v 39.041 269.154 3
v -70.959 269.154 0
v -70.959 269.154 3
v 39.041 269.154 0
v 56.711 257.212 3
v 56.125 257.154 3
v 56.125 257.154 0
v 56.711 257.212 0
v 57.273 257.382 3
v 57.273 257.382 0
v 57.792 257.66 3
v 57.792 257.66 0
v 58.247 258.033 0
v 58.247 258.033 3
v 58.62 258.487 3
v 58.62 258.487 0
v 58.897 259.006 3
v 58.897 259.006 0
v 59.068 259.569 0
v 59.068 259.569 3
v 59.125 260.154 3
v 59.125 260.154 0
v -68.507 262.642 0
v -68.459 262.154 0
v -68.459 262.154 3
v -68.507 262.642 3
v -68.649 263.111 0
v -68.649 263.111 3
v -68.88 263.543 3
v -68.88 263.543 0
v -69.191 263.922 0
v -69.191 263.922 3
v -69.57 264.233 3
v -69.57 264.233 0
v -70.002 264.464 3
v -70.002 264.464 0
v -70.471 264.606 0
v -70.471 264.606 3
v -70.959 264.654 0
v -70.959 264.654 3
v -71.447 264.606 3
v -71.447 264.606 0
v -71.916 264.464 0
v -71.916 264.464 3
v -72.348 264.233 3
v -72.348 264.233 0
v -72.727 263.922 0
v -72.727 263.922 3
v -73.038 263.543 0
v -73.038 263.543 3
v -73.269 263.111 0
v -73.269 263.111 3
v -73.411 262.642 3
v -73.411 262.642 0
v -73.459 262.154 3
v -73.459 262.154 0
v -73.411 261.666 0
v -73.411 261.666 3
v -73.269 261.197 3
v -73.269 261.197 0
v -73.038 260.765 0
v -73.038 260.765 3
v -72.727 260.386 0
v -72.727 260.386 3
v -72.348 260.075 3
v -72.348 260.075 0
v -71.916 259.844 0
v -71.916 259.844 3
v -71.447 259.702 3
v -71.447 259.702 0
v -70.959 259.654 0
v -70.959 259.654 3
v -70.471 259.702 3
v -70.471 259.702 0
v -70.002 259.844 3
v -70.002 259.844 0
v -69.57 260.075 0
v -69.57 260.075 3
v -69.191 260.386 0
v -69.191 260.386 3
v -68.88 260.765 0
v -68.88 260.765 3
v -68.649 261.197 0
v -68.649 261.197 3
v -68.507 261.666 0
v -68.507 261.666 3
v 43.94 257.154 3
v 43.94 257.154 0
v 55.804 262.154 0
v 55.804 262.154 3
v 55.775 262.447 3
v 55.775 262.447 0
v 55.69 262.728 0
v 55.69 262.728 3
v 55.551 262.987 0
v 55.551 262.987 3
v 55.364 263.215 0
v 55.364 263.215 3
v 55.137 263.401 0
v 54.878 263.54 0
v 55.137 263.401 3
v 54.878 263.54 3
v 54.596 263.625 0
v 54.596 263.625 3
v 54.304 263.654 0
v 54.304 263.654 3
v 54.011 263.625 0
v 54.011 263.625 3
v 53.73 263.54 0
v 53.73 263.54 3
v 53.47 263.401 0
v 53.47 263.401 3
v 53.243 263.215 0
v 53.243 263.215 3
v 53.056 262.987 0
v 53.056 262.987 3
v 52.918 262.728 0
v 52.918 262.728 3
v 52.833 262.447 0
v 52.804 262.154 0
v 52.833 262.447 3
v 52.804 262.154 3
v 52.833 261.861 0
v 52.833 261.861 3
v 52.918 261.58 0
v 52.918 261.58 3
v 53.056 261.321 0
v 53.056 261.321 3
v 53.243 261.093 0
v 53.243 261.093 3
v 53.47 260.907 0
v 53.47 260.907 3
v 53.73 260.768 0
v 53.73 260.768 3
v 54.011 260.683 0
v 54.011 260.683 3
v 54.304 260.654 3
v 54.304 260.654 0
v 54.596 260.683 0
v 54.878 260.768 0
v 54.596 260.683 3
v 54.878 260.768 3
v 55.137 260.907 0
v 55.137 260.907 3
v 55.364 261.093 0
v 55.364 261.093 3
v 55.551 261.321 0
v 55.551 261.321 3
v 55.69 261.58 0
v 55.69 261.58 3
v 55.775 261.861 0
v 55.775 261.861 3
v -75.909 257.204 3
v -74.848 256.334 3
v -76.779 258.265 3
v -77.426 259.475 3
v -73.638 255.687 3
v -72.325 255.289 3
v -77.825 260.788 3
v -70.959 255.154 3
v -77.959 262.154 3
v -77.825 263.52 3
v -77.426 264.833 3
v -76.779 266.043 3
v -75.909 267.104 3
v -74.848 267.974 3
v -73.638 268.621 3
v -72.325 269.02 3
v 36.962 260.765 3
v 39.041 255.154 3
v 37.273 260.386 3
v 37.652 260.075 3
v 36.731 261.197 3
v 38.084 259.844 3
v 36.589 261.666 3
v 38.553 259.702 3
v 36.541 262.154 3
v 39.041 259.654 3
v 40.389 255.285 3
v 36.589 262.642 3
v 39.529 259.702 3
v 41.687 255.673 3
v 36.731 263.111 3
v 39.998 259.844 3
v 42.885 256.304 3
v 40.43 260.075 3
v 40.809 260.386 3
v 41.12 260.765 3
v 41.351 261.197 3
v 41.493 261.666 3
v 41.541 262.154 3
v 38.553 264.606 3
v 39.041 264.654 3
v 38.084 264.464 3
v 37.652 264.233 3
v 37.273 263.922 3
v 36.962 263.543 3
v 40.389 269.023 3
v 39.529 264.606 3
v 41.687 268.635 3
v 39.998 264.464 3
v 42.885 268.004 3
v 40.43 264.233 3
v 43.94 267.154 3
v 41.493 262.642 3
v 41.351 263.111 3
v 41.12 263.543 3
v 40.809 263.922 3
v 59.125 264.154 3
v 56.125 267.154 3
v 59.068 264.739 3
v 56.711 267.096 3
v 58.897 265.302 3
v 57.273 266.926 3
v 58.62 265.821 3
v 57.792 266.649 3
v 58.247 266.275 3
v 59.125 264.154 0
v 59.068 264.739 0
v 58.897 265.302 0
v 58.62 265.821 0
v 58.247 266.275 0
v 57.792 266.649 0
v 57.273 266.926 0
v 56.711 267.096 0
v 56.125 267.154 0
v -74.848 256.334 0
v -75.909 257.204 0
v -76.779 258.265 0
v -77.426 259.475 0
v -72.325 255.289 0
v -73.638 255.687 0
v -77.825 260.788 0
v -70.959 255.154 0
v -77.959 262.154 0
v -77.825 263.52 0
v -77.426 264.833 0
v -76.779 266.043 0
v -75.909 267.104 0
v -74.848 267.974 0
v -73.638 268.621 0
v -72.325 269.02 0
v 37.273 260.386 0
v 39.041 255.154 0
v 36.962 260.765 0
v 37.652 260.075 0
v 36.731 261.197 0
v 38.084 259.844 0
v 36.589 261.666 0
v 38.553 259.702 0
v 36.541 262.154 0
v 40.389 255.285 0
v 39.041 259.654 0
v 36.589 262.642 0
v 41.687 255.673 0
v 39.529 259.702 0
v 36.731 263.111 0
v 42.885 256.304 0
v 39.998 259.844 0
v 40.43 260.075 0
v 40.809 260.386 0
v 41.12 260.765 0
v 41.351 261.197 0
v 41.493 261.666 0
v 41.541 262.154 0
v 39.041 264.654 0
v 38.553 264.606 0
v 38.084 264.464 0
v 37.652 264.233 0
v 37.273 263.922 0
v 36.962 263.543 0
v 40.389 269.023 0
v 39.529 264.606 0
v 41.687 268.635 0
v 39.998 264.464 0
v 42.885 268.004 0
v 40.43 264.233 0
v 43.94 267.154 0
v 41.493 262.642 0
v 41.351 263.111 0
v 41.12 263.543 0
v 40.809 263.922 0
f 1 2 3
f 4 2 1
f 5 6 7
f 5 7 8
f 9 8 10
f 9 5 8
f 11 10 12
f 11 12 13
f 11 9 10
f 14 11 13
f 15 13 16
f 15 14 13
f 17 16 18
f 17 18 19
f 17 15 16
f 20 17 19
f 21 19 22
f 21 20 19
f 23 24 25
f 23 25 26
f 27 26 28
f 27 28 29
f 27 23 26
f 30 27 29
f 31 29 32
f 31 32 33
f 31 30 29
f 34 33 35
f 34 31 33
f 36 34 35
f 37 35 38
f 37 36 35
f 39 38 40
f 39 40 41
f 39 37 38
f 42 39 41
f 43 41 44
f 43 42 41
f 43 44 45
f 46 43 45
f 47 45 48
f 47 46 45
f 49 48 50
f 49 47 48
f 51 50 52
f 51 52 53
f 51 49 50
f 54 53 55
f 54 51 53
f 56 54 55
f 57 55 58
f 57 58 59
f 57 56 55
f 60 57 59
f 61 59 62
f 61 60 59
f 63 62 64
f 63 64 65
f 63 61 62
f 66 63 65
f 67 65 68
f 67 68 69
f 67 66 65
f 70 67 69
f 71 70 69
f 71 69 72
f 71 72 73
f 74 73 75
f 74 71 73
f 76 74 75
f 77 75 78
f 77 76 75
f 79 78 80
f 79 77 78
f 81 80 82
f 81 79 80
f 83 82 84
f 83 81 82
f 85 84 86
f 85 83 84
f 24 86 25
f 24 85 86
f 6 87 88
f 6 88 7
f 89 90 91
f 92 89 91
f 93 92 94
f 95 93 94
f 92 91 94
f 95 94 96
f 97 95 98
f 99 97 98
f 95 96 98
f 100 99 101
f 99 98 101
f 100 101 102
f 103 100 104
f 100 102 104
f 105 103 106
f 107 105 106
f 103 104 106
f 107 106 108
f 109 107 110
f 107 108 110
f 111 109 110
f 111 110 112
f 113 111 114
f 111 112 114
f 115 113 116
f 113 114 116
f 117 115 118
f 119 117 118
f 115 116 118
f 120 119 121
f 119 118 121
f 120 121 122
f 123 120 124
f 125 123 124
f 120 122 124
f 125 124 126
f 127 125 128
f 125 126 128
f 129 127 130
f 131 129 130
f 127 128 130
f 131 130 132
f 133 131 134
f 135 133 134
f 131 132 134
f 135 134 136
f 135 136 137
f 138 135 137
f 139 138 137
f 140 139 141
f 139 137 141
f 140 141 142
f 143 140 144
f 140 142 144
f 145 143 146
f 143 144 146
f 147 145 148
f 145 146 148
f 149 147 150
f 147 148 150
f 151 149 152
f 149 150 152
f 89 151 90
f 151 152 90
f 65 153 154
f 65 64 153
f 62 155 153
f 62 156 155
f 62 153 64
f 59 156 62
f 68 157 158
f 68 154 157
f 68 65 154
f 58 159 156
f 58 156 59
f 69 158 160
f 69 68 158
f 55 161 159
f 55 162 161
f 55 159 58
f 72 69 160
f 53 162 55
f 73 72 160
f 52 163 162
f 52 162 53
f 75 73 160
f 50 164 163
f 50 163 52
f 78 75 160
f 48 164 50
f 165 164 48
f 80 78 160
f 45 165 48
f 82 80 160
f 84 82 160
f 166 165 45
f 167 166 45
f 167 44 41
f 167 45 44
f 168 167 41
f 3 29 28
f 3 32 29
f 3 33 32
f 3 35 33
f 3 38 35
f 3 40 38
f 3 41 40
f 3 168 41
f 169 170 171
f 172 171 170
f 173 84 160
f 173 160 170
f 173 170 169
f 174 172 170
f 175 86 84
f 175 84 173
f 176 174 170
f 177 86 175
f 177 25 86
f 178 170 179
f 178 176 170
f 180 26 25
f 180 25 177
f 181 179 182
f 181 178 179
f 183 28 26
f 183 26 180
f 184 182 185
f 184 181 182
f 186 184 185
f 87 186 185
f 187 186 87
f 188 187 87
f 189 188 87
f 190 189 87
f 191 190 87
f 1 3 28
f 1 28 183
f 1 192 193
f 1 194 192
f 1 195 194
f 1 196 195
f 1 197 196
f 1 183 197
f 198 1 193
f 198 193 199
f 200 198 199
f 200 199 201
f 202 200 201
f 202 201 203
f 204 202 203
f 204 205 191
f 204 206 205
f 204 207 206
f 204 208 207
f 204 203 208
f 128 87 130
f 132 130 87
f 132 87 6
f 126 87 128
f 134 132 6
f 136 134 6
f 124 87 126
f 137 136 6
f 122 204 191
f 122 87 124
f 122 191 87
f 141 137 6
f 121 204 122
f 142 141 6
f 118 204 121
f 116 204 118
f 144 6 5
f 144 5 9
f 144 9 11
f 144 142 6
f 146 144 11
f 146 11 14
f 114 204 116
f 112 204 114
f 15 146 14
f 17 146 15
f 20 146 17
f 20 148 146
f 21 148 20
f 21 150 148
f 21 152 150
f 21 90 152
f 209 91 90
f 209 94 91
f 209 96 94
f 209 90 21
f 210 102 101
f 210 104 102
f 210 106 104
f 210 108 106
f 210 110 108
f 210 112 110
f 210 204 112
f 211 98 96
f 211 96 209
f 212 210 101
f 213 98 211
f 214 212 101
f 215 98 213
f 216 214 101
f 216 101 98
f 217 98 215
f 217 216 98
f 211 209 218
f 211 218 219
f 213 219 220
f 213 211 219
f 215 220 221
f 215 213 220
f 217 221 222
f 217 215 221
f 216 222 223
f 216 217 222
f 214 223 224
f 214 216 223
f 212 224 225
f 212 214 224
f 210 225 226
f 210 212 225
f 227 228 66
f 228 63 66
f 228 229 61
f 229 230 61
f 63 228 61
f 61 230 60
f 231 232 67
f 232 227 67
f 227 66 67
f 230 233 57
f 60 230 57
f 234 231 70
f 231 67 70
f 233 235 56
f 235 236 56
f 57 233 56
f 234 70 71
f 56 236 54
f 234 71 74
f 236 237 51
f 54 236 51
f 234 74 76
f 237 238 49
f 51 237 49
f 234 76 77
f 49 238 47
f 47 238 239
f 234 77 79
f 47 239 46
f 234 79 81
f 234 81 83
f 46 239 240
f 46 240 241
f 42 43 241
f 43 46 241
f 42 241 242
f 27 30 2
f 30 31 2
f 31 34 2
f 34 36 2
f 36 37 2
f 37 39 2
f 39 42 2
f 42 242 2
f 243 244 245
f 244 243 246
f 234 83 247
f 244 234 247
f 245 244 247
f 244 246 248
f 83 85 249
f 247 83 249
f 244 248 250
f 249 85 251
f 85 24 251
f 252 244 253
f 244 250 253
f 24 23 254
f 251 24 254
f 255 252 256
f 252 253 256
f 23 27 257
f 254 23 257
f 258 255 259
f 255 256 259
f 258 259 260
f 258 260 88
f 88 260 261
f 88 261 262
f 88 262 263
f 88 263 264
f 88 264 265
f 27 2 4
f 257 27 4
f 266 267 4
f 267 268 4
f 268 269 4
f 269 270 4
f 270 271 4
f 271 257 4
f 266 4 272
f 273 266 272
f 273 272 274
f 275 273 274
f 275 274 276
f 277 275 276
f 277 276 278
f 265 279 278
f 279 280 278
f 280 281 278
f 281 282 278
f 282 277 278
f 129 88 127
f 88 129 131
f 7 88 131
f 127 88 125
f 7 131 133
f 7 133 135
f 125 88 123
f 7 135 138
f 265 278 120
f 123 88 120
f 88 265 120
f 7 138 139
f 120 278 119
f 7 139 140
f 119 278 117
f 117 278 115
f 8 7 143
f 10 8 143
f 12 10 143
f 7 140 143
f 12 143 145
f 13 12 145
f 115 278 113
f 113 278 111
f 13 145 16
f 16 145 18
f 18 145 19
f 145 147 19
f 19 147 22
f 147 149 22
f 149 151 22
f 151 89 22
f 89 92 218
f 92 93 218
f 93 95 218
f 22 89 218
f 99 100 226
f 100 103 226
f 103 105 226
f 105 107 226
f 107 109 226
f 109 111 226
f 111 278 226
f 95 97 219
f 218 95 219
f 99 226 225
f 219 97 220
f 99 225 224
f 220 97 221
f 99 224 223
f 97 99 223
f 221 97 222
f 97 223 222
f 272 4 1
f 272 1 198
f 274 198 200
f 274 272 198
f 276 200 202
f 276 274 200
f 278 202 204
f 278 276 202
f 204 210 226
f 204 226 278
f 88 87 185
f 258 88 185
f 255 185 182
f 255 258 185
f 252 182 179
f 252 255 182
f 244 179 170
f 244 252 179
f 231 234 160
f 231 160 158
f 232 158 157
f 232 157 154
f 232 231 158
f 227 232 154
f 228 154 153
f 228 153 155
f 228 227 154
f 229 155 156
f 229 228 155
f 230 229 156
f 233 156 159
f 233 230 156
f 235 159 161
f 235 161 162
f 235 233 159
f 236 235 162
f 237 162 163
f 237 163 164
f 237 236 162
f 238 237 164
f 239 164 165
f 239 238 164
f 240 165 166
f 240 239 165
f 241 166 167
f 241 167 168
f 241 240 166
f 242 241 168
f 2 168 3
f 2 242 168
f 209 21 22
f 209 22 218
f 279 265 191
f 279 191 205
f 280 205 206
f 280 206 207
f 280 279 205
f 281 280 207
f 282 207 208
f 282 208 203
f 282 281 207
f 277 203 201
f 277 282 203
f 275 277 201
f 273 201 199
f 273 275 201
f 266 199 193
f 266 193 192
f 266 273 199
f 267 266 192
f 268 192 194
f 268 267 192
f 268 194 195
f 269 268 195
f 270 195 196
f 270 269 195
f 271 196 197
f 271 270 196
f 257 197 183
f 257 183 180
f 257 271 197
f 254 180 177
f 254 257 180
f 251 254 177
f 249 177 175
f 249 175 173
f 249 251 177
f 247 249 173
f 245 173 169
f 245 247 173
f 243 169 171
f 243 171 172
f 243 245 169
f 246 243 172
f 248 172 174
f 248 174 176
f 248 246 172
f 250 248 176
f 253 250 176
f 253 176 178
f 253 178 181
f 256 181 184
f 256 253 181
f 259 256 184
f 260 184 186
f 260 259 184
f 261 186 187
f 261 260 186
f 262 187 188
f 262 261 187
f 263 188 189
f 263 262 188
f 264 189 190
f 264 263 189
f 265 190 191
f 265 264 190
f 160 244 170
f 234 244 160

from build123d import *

# Parameters (mm, degrees)
SKETCH1_R           = 2.5
BOSS_EXTRUDE1_DEPTH = 3
SKETCH2_R           = 1.5
BOSS_EXTRUDE2_DEPTH = 3


with BuildPart() as part:
    # Sketch1 → Boss-Extrude1 (new body)
    with BuildSketch(Plane.XY):
        with BuildLine():
            Line((-70.959009299, 269.154117688), (39.040990701, 269.154117688))
            ThreePointArc((39.040990701, 269.154117688), (46.040990701, 262.154117688), (39.040990701, 255.154117688))
            Line((39.040990701, 255.154117688), (-70.959009299, 255.154117688))
            ThreePointArc((-70.959009299, 255.154117688), (-77.959009299, 262.154117688), (-70.959009299, 269.154117688))
        make_face()
        with Locations((-70.959009299, 262.154117688)):
            Circle(SKETCH1_R, mode=Mode.SUBTRACT)
        with Locations((39.040990701, 262.154117688)):
            Circle(SKETCH1_R, mode=Mode.SUBTRACT)
    extrude(amount=BOSS_EXTRUDE1_DEPTH)

    # Sketch2 → Boss-Extrude2 (add)
    with BuildSketch(Plane.XY.offset(3)):
        with BuildLine():
            Line((56.125358764, 267.154117688), (42.581100141, 267.154117688))
            Line((42.581100141, 267.154117688), (42.581100141, 257.154117688))
            Line((42.581100141, 257.154117688), (56.125358764, 257.154117688))
            ThreePointArc((56.125358764, 257.154117688), (58.246679107, 258.032797345), (59.125358764, 260.154117688))
            Line((59.125358764, 260.154117688), (59.125358764, 264.154117688))
            ThreePointArc((59.125358764, 264.154117688), (58.246679107, 266.275438032), (56.125358764, 267.154117688))
        make_face()
        with Locations((54.303681244, 262.154117688)):
            Circle(SKETCH2_R, mode=Mode.SUBTRACT)
    extrude(amount=-BOSS_EXTRUDE2_DEPTH)


solid = part.part
